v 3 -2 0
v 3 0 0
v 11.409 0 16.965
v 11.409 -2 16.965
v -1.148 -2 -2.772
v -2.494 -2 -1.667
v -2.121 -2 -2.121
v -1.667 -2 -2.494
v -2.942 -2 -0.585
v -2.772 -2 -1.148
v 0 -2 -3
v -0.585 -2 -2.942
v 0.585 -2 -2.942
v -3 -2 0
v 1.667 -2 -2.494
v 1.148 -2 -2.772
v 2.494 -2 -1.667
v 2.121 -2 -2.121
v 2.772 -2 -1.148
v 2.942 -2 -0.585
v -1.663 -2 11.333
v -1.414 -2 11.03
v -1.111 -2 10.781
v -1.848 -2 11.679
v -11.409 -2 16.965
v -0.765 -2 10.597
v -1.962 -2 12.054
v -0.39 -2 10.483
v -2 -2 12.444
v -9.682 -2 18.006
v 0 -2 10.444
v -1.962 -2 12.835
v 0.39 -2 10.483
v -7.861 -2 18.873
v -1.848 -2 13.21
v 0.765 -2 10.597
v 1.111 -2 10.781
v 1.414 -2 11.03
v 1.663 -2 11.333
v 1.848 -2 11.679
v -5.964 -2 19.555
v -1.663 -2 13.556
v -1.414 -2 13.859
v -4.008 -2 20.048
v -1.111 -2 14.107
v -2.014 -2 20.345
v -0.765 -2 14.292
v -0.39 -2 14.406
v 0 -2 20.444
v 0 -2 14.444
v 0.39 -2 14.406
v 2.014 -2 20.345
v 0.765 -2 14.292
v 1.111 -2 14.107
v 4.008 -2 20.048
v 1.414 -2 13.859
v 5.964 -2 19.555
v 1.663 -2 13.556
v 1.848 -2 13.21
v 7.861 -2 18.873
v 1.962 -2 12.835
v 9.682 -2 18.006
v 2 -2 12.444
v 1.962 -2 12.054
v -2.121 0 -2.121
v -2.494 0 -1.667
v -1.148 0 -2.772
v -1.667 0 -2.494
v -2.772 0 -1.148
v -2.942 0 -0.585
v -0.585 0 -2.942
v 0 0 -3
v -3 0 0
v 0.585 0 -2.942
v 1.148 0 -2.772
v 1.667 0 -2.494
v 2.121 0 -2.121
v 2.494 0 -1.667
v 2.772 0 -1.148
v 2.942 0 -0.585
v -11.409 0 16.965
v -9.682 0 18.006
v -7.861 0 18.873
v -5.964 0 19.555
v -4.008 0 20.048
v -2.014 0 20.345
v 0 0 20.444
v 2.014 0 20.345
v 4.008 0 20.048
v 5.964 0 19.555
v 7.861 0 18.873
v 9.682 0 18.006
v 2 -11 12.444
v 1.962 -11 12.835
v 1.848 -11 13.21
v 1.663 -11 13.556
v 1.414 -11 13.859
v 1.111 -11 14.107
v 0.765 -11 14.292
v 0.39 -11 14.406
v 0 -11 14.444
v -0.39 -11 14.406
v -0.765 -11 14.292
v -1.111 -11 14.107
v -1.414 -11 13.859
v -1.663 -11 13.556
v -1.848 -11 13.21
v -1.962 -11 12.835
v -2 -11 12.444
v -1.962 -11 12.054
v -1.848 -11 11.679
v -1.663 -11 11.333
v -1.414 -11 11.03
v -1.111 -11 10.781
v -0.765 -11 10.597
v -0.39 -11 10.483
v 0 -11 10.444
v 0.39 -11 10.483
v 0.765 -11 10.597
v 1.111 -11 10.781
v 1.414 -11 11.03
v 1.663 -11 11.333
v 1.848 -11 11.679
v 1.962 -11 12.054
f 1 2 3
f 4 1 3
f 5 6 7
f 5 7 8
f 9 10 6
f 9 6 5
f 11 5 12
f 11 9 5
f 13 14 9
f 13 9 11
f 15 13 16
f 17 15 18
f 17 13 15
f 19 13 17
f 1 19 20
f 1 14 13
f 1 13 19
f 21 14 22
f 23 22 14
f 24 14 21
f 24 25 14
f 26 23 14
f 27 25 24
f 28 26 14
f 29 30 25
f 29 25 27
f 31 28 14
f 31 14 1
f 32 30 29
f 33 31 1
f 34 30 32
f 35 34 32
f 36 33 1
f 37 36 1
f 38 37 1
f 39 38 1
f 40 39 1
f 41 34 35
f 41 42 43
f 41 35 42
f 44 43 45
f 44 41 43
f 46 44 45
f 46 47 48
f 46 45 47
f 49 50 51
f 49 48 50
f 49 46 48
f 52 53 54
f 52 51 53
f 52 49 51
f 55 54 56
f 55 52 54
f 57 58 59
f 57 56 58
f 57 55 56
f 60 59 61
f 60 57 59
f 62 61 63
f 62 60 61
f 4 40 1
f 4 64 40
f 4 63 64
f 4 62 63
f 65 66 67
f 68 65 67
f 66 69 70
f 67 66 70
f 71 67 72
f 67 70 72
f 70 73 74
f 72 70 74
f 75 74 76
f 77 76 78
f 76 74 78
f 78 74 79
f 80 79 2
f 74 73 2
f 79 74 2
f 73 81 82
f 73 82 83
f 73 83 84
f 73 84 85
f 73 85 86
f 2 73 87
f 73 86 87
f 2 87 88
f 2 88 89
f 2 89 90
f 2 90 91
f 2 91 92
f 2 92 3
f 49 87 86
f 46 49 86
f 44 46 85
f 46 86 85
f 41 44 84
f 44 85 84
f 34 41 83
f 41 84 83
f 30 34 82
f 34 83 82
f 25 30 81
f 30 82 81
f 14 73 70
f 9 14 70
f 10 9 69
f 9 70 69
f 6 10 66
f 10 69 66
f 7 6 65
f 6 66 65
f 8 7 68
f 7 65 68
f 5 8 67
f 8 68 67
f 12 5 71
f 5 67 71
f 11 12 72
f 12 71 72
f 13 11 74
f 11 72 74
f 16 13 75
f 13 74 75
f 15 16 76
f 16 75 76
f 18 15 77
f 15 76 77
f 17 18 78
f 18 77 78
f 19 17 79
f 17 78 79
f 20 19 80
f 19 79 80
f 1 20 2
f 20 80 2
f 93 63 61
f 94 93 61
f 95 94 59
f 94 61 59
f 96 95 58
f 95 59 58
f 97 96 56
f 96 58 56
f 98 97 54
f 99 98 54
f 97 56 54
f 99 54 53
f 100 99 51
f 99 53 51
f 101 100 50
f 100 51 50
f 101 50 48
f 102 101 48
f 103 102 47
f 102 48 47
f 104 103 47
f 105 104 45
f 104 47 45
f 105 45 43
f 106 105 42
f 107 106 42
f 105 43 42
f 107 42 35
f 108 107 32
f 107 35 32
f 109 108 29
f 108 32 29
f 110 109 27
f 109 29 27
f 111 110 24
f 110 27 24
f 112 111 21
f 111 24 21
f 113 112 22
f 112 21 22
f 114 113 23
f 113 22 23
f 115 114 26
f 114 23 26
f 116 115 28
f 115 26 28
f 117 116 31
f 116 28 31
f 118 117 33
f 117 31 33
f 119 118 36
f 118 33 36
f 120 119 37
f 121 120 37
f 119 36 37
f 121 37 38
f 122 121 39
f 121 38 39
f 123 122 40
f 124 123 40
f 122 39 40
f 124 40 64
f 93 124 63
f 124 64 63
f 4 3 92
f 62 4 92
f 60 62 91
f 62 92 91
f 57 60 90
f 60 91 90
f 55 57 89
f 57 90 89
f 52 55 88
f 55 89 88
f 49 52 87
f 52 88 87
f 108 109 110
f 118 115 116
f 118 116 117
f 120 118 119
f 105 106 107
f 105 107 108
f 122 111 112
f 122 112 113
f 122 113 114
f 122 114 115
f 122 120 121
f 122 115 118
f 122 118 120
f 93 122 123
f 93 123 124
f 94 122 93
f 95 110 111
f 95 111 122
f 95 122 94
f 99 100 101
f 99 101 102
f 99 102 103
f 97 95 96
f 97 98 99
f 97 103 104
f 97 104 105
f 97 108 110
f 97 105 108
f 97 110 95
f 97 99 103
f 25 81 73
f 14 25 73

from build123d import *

# Parameters (mm, degrees)
F1_DEPTH = 2
F2_R     = 2
F3_DEPTH = 9
F4_R     = 3
F5_DEPTH = 2


with BuildPart() as f1:
    # F0 (on Front) → F1 (new body)
    with BuildSketch(Plane.XZ):
        with BuildLine():
            Line((-11.4086838439, 16.9650800526), (-3, 0))
            Line((-3, 0), (3, 0))
            Line((3, 0), (11.4086838439, 16.9650800526))
            ThreePointArc((11.4086838439, 16.9650800526), (5.9637128105, 19.5552074332), (0, 20.444363728))
            ThreePointArc((0, 20.444363728), (-5.9637128105, 19.5552074332), (-11.4086838439, 16.9650800526))
        make_face()
    extrude(amount=F1_DEPTH)

    # F2 (on face) → F3 (join)
    with BuildSketch(Plane.XZ.offset(2)):
        with Locations((0, 12.444363728)):
            Circle(F2_R)
    extrude(amount=F3_DEPTH)

    # F4 (on Front) → F5 (join)
    with BuildSketch(Plane.XZ):
        Circle(F4_R)
    extrude(amount=F5_DEPTH)


solid = f1.part
